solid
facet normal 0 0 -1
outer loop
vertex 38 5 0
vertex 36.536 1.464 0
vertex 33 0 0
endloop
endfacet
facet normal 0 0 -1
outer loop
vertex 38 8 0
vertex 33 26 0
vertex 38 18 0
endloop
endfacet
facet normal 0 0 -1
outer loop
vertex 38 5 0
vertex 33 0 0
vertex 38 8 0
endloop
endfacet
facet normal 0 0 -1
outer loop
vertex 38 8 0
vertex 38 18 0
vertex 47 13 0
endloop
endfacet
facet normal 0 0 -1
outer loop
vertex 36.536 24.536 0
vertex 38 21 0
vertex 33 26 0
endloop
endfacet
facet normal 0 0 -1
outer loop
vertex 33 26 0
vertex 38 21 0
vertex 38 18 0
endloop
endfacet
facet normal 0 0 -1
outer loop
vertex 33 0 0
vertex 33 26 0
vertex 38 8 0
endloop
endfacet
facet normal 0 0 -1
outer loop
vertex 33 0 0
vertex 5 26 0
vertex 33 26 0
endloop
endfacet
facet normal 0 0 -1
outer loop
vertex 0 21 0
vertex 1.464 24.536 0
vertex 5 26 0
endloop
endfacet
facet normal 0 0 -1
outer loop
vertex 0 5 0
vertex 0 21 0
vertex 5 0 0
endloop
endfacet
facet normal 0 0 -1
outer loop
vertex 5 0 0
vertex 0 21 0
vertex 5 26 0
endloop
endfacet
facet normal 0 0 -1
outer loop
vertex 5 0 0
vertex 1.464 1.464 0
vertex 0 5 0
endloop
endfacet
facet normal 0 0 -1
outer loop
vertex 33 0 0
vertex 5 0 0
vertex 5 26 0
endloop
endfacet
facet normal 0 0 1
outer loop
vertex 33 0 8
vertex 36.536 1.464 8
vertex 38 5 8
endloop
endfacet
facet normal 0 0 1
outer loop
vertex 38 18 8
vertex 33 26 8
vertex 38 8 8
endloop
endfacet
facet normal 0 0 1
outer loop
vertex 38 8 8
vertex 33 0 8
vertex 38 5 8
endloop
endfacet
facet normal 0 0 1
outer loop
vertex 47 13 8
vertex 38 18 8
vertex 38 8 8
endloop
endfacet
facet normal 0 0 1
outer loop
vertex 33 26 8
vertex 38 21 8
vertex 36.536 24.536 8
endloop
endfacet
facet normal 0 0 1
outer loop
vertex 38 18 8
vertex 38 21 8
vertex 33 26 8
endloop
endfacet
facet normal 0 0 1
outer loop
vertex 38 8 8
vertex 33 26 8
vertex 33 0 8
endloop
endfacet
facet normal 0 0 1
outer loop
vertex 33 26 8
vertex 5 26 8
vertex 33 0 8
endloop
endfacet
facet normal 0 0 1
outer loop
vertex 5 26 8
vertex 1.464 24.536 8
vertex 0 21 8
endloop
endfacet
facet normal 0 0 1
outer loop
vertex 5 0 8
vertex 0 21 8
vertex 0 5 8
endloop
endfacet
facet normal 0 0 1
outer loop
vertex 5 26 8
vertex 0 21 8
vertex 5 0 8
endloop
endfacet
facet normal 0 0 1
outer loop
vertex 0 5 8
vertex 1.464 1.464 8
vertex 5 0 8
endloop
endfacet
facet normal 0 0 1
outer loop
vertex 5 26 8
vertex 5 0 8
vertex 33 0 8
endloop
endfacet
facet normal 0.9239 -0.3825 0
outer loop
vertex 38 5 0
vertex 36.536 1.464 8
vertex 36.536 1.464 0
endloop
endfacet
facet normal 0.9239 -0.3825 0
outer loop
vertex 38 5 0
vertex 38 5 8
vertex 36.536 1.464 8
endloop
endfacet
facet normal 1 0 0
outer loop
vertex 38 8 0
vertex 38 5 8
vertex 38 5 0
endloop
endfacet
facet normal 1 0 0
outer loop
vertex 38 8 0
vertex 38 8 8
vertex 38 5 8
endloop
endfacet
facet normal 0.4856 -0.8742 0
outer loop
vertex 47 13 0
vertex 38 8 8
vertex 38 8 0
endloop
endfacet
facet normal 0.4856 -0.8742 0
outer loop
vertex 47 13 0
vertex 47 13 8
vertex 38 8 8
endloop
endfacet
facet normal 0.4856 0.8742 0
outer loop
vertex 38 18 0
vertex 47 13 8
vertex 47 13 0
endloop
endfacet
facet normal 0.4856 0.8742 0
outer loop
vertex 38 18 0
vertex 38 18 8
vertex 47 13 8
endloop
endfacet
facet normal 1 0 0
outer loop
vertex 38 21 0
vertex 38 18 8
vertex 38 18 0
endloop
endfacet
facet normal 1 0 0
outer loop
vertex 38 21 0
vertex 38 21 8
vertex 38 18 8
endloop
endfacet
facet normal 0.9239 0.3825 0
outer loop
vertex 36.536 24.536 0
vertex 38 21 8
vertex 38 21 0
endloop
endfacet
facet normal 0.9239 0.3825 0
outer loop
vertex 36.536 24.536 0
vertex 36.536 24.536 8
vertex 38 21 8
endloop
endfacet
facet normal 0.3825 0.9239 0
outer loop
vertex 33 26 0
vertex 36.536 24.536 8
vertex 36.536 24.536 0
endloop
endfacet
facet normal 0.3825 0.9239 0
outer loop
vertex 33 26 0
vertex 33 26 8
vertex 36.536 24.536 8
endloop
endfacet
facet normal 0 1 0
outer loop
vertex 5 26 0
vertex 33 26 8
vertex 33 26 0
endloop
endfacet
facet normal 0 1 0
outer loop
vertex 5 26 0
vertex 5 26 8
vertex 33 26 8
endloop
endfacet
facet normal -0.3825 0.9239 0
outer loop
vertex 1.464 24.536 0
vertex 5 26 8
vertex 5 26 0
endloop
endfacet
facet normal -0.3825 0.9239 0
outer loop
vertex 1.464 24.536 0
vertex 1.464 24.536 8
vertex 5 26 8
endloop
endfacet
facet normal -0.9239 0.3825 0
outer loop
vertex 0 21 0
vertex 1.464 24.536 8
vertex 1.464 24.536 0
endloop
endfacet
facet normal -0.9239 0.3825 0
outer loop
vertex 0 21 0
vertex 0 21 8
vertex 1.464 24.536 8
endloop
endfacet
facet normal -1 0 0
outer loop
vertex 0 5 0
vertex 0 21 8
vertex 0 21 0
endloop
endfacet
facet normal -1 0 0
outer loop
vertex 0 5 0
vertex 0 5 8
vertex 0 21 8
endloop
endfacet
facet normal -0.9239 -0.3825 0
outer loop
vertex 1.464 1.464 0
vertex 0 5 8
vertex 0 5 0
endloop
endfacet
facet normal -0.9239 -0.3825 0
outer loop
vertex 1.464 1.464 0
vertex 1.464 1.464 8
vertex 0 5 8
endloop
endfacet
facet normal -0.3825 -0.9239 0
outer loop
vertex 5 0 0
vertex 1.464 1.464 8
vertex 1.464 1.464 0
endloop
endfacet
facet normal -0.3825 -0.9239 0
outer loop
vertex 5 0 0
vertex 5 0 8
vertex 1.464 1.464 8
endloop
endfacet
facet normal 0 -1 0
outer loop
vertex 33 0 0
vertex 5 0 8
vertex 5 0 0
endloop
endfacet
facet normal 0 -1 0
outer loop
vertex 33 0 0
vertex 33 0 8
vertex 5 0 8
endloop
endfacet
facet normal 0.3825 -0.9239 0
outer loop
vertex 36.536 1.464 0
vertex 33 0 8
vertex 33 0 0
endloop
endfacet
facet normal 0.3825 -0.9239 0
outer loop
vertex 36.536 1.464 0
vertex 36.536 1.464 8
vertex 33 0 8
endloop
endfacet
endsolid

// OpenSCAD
$fn = 32;

// ----------------------------------------------------------------------
// Ratchet pawl: 38 x 26 mm body, beak 9 mm с правого торца
// ----------------------------------------------------------------------

// --- parameters (mm) ---
profile_height = 8;       // extrusion height
profile_points = 15;      // points of the closed outline

profile = [[0, 5], [1.464, 1.464], [5, 0], [33, 0], [36.536, 1.464], [38, 5], [38, 8], [47, 13], [38, 18], [38, 21], [36.536, 24.536], [33, 26], [5, 26], [1.464, 24.536], [0, 21]];  // single closed polygon, 15 points, counter clockwise

// --- the one profile operation ---
linear_extrude(height = profile_height) polygon(points = profile);
